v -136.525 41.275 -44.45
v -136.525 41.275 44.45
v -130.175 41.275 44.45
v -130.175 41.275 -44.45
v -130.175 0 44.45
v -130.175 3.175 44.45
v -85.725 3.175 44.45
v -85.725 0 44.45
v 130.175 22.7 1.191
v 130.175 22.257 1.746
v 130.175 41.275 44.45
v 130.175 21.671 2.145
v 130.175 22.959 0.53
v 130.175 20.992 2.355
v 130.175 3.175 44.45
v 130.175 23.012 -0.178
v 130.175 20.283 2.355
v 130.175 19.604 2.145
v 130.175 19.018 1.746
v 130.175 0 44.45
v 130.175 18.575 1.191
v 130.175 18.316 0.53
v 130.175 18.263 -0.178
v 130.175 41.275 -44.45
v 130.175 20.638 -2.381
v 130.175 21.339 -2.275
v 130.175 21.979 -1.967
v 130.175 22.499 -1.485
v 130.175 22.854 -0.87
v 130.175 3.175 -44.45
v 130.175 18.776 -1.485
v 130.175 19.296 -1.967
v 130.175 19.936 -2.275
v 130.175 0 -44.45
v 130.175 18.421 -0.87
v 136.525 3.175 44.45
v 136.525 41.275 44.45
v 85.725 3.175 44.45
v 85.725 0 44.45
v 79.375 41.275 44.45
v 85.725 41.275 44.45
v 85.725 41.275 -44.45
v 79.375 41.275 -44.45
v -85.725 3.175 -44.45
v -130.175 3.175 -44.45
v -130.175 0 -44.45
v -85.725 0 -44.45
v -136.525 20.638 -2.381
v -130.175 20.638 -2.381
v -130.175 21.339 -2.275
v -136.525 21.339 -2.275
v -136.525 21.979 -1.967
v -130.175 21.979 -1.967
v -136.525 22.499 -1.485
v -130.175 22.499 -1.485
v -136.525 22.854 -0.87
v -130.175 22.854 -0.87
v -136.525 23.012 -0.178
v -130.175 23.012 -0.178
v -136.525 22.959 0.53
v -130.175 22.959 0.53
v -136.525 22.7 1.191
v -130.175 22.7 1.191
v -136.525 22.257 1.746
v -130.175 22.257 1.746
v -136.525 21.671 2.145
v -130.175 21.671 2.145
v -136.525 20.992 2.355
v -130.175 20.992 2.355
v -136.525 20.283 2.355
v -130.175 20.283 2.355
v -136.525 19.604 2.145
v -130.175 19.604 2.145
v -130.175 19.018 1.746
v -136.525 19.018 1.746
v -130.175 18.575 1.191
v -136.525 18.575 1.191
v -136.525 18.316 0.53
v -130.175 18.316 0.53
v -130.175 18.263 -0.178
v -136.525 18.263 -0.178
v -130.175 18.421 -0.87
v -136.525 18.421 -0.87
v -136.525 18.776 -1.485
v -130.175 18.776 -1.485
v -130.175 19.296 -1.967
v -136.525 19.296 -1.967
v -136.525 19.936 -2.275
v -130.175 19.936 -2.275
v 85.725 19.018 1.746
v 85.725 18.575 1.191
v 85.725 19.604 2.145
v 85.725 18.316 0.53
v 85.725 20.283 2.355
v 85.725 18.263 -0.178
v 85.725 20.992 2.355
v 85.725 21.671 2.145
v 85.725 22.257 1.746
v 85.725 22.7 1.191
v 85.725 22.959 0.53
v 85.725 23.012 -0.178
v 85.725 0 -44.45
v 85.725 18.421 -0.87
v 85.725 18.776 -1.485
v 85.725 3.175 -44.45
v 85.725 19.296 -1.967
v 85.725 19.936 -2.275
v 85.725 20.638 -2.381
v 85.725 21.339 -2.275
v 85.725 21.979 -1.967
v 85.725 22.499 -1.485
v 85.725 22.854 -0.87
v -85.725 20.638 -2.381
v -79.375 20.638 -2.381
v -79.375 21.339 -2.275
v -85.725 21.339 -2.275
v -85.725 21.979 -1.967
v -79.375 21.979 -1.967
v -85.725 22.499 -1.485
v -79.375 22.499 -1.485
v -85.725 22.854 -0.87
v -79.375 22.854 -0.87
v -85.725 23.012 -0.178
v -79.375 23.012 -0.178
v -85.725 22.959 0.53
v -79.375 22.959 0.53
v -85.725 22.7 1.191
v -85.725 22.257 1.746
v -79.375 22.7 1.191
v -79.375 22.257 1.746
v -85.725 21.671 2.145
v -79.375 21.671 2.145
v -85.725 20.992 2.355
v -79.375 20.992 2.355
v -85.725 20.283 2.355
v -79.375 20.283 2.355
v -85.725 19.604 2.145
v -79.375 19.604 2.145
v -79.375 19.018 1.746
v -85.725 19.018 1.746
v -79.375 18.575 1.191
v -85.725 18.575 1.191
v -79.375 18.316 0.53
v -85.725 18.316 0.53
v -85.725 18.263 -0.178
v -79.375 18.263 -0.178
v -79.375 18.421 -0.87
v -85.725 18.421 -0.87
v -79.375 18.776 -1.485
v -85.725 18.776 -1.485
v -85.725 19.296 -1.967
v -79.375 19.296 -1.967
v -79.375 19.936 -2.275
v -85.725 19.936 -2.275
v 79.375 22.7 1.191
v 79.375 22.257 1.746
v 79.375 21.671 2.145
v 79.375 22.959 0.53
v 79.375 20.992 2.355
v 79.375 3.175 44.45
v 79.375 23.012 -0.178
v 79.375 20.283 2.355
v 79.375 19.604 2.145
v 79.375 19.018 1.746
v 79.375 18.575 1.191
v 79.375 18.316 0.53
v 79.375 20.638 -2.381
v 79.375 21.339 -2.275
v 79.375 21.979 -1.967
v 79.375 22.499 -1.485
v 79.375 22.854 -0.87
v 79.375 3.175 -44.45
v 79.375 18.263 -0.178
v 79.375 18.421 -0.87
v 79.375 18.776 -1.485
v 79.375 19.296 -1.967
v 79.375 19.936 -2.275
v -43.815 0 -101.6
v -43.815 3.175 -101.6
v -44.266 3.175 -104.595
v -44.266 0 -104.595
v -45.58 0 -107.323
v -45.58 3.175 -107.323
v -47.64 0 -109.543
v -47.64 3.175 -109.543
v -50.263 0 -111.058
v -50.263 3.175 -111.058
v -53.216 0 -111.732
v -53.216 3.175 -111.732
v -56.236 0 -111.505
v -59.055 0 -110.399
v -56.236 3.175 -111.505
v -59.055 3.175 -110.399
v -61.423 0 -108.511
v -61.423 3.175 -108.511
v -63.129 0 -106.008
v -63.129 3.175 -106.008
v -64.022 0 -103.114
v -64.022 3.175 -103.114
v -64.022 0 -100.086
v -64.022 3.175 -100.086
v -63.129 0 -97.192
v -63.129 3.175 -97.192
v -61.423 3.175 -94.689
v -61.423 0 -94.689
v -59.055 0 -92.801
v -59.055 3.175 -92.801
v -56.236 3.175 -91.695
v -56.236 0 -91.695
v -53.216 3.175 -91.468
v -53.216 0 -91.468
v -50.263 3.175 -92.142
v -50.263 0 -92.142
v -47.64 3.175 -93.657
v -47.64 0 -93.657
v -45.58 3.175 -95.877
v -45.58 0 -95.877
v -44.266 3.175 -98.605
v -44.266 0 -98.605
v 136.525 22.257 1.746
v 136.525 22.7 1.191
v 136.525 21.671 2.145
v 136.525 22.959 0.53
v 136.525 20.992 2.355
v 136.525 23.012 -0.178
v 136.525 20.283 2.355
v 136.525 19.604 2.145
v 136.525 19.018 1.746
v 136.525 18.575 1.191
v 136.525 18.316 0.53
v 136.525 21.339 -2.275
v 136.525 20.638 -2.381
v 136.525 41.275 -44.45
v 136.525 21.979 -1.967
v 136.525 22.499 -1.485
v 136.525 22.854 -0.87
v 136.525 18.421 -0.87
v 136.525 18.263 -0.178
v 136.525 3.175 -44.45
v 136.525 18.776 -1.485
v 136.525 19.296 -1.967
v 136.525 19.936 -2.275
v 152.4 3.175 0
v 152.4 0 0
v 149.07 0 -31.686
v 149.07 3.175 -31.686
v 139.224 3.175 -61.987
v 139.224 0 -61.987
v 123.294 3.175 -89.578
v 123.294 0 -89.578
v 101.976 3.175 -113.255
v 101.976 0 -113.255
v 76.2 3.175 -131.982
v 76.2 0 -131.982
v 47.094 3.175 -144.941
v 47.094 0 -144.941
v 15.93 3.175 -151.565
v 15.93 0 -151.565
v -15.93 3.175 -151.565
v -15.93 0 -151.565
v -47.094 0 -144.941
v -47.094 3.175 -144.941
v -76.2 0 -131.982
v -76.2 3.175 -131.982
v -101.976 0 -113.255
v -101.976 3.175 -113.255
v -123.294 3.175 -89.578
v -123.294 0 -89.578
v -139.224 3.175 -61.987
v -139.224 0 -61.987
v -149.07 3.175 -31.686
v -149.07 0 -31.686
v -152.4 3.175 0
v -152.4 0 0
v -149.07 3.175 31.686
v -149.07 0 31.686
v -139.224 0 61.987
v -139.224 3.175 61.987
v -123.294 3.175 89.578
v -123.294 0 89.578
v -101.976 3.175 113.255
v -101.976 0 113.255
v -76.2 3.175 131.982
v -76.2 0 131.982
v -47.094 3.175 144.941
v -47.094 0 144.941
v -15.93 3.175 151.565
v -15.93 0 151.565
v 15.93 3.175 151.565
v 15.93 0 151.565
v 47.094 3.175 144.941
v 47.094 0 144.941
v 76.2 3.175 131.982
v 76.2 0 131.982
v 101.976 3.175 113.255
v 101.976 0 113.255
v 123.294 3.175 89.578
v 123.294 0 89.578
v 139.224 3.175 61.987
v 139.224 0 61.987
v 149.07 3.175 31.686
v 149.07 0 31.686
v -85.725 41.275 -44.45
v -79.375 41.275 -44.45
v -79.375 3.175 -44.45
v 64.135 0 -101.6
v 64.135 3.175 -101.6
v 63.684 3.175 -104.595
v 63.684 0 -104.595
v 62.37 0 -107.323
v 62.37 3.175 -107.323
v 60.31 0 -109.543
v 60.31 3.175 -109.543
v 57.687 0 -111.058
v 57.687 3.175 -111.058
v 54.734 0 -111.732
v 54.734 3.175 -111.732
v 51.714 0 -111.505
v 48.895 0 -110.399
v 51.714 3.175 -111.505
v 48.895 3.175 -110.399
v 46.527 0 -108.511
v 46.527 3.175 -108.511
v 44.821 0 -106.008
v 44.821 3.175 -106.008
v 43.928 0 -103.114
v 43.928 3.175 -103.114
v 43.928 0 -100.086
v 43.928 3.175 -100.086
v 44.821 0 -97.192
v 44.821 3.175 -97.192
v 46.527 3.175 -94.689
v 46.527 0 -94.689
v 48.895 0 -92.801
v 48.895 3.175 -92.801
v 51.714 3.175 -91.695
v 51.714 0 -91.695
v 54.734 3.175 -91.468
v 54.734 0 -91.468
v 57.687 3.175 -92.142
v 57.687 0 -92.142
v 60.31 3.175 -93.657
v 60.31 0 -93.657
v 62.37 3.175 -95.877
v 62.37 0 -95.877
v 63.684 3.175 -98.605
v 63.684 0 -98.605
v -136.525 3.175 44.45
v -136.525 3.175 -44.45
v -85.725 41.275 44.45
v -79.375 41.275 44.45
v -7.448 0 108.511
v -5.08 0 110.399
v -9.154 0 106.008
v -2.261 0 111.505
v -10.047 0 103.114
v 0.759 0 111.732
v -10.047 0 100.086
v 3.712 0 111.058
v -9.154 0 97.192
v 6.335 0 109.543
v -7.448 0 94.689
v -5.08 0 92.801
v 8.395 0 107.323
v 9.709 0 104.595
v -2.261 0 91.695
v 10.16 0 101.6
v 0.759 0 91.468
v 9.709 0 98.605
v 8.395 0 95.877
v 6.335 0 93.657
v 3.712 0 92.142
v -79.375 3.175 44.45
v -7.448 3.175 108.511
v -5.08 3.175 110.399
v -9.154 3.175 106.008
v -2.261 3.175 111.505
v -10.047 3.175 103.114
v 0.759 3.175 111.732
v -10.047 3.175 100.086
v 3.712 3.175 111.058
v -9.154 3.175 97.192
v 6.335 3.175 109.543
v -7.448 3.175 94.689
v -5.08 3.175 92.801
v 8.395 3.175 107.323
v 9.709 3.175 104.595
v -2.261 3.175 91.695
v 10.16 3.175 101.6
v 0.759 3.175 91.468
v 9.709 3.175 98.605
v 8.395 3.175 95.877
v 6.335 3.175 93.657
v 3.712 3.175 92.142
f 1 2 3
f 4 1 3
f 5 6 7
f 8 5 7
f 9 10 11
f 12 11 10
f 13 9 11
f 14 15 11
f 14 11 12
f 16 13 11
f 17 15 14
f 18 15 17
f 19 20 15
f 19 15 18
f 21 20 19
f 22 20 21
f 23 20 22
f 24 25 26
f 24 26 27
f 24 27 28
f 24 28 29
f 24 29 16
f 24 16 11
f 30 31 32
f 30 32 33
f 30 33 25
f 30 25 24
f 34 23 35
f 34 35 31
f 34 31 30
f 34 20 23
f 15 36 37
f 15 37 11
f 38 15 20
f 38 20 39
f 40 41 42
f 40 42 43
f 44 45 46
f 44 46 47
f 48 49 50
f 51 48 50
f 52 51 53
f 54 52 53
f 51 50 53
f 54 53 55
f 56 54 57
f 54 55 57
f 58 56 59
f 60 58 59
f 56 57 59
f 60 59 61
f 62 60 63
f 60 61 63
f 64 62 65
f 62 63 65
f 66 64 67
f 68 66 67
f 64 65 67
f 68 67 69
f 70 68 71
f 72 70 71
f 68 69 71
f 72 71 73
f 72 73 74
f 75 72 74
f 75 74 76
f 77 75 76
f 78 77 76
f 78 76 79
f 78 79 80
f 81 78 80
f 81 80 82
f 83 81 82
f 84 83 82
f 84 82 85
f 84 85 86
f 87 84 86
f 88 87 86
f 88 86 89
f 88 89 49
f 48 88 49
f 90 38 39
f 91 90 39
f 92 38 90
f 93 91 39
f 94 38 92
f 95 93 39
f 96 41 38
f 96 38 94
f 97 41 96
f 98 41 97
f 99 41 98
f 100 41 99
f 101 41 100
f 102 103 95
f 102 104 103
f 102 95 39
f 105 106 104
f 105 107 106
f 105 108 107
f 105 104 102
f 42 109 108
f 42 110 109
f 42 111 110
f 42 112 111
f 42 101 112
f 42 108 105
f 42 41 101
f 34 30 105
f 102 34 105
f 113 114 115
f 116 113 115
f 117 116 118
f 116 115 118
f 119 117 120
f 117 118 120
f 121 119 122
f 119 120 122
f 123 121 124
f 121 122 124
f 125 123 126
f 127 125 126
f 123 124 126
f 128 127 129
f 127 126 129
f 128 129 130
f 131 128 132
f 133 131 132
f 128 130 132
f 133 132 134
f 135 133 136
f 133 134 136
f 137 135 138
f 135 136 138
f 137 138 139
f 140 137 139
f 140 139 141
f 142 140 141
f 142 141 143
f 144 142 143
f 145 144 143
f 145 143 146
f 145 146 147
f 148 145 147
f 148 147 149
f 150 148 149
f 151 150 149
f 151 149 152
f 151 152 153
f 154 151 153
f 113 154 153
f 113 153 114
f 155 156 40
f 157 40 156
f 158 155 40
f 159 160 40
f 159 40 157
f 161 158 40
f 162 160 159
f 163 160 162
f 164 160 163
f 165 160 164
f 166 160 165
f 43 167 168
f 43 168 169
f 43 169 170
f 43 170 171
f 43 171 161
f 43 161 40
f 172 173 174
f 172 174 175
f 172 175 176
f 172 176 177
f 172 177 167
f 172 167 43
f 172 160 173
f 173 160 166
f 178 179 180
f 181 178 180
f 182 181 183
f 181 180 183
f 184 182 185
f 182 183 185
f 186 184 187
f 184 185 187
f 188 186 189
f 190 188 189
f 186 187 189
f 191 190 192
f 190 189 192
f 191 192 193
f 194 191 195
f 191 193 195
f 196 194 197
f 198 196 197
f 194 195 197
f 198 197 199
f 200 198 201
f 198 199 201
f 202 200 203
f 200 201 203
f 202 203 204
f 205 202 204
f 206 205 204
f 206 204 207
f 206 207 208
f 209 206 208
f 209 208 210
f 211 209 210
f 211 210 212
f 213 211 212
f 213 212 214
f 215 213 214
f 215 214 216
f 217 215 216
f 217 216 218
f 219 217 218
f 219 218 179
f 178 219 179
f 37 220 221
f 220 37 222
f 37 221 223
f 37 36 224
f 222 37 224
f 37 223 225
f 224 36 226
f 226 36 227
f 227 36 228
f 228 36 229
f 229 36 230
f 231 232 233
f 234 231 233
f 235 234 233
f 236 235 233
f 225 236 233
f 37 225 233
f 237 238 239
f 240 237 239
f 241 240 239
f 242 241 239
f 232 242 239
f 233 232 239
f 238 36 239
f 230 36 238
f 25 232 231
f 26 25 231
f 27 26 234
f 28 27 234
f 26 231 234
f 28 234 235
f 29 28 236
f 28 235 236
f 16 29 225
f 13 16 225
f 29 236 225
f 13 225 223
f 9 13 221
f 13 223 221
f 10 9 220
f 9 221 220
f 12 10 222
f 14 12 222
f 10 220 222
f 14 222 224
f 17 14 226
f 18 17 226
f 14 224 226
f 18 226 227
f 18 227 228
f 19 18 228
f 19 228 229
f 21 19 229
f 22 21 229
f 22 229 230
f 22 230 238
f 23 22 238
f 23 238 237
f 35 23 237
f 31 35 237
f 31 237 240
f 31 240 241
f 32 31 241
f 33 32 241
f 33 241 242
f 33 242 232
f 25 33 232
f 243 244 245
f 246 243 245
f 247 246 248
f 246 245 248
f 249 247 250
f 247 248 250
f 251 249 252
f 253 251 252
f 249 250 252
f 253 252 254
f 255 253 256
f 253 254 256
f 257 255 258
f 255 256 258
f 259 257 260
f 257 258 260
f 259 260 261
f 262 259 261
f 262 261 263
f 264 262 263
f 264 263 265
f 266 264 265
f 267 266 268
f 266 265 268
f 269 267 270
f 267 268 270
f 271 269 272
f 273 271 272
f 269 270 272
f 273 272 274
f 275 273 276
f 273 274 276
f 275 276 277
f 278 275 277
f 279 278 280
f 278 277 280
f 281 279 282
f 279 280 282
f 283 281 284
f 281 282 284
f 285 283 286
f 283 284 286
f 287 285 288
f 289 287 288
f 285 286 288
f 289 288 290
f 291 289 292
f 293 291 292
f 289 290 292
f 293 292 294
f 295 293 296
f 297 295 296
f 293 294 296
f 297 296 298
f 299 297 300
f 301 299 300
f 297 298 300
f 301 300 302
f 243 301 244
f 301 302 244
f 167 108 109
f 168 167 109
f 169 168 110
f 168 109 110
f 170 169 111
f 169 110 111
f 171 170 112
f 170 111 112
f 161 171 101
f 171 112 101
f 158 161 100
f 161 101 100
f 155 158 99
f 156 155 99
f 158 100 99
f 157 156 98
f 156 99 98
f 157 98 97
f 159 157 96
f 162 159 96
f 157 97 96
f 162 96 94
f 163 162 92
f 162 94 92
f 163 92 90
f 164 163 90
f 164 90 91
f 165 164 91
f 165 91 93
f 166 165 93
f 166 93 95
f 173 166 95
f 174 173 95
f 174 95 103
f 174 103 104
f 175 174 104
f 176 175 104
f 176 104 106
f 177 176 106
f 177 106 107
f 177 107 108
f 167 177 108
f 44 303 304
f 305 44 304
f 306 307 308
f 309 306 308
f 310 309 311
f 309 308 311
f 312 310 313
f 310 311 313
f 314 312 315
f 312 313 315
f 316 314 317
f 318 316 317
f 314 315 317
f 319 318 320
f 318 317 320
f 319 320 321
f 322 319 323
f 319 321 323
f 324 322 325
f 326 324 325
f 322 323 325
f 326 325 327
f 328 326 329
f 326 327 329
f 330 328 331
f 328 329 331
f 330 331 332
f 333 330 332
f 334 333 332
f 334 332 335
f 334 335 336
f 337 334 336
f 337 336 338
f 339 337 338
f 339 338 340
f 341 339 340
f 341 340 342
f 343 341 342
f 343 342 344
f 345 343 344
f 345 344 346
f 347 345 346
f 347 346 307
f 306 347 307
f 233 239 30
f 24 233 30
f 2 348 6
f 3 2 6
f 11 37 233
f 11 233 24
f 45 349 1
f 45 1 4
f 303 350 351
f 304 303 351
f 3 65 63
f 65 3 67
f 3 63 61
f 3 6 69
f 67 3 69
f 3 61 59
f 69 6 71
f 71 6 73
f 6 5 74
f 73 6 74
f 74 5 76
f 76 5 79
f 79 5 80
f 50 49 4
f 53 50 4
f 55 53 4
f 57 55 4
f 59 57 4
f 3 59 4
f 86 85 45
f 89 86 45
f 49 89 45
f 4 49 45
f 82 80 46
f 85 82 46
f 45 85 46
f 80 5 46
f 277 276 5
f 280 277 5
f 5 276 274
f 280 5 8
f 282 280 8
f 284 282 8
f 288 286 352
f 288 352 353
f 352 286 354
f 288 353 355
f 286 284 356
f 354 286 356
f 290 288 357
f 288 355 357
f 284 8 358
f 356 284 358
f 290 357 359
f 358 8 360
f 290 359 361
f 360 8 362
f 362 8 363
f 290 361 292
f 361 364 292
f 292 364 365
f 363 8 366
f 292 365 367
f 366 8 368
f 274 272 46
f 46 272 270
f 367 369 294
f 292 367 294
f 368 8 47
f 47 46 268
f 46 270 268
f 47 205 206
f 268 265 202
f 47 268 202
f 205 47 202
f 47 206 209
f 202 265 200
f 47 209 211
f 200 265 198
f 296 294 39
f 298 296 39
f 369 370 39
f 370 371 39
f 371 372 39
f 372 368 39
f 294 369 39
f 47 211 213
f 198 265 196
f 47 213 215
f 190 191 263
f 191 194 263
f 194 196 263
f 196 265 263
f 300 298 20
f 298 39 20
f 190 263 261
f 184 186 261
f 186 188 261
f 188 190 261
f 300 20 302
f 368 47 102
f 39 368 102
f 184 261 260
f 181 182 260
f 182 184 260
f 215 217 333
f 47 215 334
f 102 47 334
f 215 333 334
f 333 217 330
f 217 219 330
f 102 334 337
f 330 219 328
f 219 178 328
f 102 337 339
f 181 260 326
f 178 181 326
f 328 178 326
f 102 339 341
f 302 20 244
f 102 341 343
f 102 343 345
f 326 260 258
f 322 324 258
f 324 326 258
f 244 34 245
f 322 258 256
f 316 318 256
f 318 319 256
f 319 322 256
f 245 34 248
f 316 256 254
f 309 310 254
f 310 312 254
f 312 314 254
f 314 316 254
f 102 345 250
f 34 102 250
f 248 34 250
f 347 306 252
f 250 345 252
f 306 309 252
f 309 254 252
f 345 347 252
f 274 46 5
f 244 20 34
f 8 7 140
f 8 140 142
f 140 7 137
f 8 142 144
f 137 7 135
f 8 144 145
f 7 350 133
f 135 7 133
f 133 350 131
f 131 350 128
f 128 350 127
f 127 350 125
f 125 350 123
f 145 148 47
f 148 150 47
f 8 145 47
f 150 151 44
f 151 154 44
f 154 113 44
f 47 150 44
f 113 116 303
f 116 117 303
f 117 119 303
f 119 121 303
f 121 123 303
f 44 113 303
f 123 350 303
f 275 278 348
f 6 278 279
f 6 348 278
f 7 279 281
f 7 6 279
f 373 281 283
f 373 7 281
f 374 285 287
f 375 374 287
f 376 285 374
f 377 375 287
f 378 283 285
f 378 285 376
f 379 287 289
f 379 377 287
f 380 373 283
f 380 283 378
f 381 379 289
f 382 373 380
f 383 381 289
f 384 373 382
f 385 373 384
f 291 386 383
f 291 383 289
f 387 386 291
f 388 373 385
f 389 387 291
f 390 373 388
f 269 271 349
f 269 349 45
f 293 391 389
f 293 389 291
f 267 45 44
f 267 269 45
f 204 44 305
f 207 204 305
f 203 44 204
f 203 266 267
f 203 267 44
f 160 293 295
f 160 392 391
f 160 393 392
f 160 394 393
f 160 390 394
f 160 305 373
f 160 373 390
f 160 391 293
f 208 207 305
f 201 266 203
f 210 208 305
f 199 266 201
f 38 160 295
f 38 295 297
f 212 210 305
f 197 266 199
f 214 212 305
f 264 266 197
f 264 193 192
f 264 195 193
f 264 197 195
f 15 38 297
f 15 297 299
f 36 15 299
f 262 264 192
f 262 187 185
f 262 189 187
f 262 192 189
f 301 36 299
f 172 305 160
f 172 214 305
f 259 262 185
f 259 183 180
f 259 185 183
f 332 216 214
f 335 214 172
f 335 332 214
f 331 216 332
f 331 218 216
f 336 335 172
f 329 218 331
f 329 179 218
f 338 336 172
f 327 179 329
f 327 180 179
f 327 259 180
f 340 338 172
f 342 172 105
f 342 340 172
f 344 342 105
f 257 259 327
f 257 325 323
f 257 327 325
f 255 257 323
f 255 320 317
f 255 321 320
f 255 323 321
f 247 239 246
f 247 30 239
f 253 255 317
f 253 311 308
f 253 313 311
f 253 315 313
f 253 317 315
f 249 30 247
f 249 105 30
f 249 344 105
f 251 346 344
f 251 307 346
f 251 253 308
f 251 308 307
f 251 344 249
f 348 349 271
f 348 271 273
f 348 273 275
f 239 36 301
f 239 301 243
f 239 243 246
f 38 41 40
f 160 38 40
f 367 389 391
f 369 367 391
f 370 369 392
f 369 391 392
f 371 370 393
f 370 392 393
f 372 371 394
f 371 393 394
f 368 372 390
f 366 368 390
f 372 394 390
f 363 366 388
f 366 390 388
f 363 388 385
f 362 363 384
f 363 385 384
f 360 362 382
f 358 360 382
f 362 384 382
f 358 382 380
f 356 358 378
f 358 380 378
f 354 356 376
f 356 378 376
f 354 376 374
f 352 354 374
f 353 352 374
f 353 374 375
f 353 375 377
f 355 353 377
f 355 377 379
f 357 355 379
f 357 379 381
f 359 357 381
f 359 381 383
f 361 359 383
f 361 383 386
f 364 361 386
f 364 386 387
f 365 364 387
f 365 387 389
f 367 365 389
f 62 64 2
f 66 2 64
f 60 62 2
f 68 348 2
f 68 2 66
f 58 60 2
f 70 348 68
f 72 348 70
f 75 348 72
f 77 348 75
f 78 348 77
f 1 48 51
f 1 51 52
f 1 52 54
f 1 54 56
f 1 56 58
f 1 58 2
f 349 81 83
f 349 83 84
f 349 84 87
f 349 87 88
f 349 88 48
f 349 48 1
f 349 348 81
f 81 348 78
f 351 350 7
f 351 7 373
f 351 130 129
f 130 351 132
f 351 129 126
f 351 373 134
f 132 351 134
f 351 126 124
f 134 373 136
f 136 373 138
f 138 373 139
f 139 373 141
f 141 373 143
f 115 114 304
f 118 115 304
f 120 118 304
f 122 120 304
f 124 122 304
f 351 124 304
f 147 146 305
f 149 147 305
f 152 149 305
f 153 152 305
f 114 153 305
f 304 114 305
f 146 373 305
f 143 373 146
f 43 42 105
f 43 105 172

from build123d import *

# Parameters (mm, degrees)
SKETCH1_R           = 152.4
BOSS_EXTRUDE1_DEPTH = 3.175
SKETCH2_W           = 44.45
SKETCH2_H           = 88.9
CUT_EXTRUDE1_DEPTH  = 4.175
SKETCH3_W           = 6.35
SKETCH3_H           = 88.9
BOSS_EXTRUDE2_DEPTH = 38.1
SKETCH4_R           = 2.38125
CUT_EXTRUDE2_DEPTH  = 289.925
SKETCH5_R           = 10.16
CUT_EXTRUDE3_DEPTH  = 4.175


with BuildPart() as part:
    # Sketch1 → Boss-Extrude1 (new body)
    with BuildSketch(Plane(origin=(0, 0, 0), x_dir=(1, 0, 0), z_dir=(0, 1, 0))):
        Circle(SKETCH1_R)
    extrude(amount=BOSS_EXTRUDE1_DEPTH)

    # Sketch2 → Cut-Extrude1 (cut, through all)
    with BuildSketch(Plane(origin=(0, 3.175, 0), x_dir=(1, 0, 0), z_dir=(0, 1, 0))):
        with Locations((-107.95, 0)):
            Rectangle(SKETCH2_W, SKETCH2_H)
    cut_extrude1 = extrude(amount=-CUT_EXTRUDE1_DEPTH, mode=Mode.SUBTRACT)

    # Sketch3 → Boss-Extrude2 (add)
    with BuildSketch(Plane(origin=(0, 3.175, 0), x_dir=(1, 0, 0), z_dir=(0, 1, 0))):
        with Locations((-133.35, 0)):
            Rectangle(SKETCH3_W, SKETCH3_H)
        with Locations((-82.55, 0)):
            Rectangle(SKETCH3_W, SKETCH3_H)
    boss_extrude2 = extrude(amount=BOSS_EXTRUDE2_DEPTH)

    # Mirror1: Cut-Extrude1, Boss-Extrude2 across plane
    add(cut_extrude1.mirror(Plane(origin=(0, 0, 0), x_dir=(0, 0, 1), z_dir=(1, 0, 0))), mode=Mode.SUBTRACT)
    add(boss_extrude2.mirror(Plane(origin=(0, 0, 0), x_dir=(0, 0, 1), z_dir=(1, 0, 0))))

    # Sketch4 → Cut-Extrude2 (cut, through all)
    with BuildSketch(Plane(origin=(136.525, 0, 0), x_dir=(0, 0, -1), z_dir=(1, 0, 0))):
        with Locations((0, 20.6375)):
            Circle(SKETCH4_R)
    extrude(amount=-CUT_EXTRUDE2_DEPTH, mode=Mode.SUBTRACT)

    # Sketch5 → Cut-Extrude3 (cut, through all)
    with BuildSketch(Plane(origin=(0, 3.175, 0), x_dir=(1, 0, 0), z_dir=(0, 1, 0))):
        with Locations((0, -101.6)):
            Circle(SKETCH5_R)
        with Locations((-53.975, 101.6)):
            Circle(SKETCH5_R)
        with Locations((53.975, 101.6)):
            Circle(SKETCH5_R)
    extrude(amount=-CUT_EXTRUDE3_DEPTH, mode=Mode.SUBTRACT)


solid = part.part
